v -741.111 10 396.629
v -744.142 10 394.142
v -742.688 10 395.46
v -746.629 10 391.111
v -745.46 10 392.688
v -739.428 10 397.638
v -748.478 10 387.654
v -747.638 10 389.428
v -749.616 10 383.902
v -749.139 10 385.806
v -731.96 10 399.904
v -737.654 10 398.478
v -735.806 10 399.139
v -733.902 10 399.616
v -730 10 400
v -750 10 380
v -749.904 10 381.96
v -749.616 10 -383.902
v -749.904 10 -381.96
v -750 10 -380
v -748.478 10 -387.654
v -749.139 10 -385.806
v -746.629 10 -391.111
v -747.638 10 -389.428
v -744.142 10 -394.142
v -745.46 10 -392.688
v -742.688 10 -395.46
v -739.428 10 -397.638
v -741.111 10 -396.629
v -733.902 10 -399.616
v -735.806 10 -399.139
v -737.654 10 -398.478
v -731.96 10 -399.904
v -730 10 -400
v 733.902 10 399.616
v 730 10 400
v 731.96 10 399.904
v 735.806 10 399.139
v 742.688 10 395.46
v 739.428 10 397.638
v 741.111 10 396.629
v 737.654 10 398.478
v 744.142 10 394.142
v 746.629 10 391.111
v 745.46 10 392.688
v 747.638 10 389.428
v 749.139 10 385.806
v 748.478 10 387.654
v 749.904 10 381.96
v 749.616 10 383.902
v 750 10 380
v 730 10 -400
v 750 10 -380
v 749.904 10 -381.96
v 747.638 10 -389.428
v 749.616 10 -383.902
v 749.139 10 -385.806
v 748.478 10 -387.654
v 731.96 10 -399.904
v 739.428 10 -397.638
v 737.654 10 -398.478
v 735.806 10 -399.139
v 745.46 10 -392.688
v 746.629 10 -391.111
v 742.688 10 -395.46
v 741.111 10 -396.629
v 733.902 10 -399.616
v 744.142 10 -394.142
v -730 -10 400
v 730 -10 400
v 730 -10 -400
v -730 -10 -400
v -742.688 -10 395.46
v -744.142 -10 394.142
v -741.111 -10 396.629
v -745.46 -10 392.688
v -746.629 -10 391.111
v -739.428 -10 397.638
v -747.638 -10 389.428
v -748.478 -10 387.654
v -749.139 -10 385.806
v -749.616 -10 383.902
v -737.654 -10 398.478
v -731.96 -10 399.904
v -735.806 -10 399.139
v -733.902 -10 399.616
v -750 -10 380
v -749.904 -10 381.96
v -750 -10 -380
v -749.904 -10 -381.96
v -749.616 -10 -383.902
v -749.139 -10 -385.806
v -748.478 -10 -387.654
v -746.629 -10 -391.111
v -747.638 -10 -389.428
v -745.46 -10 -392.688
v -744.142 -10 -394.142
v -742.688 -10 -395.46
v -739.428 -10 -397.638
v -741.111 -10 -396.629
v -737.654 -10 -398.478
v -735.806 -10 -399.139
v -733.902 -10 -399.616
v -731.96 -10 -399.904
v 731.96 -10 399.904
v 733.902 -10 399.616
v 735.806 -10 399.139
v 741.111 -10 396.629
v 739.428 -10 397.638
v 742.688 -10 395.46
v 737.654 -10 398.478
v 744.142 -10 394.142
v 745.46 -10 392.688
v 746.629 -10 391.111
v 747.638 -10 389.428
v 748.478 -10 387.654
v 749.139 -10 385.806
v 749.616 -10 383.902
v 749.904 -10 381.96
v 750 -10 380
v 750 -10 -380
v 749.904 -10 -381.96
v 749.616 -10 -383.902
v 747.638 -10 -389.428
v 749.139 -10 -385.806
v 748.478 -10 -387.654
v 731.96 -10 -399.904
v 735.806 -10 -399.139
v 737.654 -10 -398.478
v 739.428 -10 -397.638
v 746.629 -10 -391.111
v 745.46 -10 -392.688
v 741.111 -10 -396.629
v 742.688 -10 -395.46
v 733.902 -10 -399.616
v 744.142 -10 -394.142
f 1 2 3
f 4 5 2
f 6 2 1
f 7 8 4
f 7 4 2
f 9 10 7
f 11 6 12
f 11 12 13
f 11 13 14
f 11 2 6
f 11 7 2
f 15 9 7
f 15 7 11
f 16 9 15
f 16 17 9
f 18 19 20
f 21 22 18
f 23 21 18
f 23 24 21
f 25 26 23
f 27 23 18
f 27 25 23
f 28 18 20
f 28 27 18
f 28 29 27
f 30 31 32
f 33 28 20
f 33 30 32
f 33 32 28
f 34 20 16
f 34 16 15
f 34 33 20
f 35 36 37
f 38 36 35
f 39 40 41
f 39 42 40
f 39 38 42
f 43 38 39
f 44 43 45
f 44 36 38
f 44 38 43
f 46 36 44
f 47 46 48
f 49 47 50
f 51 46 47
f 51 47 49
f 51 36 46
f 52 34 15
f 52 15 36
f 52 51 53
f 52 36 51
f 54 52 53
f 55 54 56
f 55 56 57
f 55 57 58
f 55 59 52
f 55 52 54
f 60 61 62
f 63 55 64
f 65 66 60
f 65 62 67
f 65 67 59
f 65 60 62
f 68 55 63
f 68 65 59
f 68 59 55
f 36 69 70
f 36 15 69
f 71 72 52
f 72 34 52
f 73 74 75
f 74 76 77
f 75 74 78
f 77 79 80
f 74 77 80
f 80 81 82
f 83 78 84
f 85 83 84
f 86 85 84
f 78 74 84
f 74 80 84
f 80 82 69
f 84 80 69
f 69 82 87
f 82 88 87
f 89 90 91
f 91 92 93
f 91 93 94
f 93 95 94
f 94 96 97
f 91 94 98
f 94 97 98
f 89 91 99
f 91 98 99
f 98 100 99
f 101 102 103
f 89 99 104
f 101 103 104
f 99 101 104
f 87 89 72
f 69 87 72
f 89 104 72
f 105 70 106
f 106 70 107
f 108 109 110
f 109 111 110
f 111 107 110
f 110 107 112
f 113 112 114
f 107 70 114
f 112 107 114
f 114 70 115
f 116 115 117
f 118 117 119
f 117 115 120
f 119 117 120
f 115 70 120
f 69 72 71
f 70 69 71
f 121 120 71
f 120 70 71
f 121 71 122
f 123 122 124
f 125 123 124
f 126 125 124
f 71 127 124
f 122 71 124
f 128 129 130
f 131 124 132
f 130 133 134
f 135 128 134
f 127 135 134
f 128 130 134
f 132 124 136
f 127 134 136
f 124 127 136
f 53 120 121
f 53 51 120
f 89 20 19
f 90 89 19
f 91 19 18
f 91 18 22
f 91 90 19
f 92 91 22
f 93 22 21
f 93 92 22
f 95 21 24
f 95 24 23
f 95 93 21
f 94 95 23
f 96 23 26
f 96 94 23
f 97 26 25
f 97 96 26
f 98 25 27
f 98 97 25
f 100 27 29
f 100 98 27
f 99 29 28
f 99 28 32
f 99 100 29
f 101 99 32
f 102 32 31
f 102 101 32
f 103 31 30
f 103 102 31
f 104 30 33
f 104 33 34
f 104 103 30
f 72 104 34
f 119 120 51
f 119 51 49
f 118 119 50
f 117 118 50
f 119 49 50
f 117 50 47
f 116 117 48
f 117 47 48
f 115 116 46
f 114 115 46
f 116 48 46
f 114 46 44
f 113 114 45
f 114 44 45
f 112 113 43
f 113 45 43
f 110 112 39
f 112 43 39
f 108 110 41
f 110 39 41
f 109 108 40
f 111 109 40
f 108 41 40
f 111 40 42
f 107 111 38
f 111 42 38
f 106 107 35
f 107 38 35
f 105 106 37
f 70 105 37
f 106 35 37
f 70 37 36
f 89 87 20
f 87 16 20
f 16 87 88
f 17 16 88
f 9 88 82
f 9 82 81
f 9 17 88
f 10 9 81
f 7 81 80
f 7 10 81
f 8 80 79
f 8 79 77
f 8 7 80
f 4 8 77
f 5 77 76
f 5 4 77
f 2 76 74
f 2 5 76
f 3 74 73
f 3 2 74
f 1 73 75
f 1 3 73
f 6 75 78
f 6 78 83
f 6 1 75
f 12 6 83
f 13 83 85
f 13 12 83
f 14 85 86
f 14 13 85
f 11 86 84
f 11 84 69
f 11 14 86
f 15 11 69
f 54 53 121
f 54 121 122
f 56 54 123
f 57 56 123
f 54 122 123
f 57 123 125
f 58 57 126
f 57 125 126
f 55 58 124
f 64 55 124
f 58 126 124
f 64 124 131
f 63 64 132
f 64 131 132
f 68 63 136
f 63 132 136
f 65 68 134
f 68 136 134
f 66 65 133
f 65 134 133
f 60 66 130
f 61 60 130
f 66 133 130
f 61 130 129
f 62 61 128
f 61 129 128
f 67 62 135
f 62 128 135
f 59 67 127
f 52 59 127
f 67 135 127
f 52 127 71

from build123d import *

# Parameters (mm, degrees)
SKETCH2_W           = 1500
SKETCH2_H           = 800
BOSS_EXTRUDE1_DEPTH = 10
FILLET1_R           = 20


with BuildPart() as part:
    # Sketch2 → Boss-Extrude1 (new body, symmetric)
    with BuildSketch(Plane(origin=(0, 0, 0), x_dir=(1, 0, 0), z_dir=(0, 1, 0))):
        Rectangle(SKETCH2_W, SKETCH2_H)
    extrude(amount=BOSS_EXTRUDE1_DEPTH, both=True)

    # Fillet1
    fillet1_edges = [part.edges().sort_by_distance(p)[0] for p in [
        (750, 0, 400),
        (-750, 0, 400),
        (-750, 0, -400),
        (750, 0, -400),
    ]]
    fillet(fillet1_edges, radius=FILLET1_R)


solid = part.part
